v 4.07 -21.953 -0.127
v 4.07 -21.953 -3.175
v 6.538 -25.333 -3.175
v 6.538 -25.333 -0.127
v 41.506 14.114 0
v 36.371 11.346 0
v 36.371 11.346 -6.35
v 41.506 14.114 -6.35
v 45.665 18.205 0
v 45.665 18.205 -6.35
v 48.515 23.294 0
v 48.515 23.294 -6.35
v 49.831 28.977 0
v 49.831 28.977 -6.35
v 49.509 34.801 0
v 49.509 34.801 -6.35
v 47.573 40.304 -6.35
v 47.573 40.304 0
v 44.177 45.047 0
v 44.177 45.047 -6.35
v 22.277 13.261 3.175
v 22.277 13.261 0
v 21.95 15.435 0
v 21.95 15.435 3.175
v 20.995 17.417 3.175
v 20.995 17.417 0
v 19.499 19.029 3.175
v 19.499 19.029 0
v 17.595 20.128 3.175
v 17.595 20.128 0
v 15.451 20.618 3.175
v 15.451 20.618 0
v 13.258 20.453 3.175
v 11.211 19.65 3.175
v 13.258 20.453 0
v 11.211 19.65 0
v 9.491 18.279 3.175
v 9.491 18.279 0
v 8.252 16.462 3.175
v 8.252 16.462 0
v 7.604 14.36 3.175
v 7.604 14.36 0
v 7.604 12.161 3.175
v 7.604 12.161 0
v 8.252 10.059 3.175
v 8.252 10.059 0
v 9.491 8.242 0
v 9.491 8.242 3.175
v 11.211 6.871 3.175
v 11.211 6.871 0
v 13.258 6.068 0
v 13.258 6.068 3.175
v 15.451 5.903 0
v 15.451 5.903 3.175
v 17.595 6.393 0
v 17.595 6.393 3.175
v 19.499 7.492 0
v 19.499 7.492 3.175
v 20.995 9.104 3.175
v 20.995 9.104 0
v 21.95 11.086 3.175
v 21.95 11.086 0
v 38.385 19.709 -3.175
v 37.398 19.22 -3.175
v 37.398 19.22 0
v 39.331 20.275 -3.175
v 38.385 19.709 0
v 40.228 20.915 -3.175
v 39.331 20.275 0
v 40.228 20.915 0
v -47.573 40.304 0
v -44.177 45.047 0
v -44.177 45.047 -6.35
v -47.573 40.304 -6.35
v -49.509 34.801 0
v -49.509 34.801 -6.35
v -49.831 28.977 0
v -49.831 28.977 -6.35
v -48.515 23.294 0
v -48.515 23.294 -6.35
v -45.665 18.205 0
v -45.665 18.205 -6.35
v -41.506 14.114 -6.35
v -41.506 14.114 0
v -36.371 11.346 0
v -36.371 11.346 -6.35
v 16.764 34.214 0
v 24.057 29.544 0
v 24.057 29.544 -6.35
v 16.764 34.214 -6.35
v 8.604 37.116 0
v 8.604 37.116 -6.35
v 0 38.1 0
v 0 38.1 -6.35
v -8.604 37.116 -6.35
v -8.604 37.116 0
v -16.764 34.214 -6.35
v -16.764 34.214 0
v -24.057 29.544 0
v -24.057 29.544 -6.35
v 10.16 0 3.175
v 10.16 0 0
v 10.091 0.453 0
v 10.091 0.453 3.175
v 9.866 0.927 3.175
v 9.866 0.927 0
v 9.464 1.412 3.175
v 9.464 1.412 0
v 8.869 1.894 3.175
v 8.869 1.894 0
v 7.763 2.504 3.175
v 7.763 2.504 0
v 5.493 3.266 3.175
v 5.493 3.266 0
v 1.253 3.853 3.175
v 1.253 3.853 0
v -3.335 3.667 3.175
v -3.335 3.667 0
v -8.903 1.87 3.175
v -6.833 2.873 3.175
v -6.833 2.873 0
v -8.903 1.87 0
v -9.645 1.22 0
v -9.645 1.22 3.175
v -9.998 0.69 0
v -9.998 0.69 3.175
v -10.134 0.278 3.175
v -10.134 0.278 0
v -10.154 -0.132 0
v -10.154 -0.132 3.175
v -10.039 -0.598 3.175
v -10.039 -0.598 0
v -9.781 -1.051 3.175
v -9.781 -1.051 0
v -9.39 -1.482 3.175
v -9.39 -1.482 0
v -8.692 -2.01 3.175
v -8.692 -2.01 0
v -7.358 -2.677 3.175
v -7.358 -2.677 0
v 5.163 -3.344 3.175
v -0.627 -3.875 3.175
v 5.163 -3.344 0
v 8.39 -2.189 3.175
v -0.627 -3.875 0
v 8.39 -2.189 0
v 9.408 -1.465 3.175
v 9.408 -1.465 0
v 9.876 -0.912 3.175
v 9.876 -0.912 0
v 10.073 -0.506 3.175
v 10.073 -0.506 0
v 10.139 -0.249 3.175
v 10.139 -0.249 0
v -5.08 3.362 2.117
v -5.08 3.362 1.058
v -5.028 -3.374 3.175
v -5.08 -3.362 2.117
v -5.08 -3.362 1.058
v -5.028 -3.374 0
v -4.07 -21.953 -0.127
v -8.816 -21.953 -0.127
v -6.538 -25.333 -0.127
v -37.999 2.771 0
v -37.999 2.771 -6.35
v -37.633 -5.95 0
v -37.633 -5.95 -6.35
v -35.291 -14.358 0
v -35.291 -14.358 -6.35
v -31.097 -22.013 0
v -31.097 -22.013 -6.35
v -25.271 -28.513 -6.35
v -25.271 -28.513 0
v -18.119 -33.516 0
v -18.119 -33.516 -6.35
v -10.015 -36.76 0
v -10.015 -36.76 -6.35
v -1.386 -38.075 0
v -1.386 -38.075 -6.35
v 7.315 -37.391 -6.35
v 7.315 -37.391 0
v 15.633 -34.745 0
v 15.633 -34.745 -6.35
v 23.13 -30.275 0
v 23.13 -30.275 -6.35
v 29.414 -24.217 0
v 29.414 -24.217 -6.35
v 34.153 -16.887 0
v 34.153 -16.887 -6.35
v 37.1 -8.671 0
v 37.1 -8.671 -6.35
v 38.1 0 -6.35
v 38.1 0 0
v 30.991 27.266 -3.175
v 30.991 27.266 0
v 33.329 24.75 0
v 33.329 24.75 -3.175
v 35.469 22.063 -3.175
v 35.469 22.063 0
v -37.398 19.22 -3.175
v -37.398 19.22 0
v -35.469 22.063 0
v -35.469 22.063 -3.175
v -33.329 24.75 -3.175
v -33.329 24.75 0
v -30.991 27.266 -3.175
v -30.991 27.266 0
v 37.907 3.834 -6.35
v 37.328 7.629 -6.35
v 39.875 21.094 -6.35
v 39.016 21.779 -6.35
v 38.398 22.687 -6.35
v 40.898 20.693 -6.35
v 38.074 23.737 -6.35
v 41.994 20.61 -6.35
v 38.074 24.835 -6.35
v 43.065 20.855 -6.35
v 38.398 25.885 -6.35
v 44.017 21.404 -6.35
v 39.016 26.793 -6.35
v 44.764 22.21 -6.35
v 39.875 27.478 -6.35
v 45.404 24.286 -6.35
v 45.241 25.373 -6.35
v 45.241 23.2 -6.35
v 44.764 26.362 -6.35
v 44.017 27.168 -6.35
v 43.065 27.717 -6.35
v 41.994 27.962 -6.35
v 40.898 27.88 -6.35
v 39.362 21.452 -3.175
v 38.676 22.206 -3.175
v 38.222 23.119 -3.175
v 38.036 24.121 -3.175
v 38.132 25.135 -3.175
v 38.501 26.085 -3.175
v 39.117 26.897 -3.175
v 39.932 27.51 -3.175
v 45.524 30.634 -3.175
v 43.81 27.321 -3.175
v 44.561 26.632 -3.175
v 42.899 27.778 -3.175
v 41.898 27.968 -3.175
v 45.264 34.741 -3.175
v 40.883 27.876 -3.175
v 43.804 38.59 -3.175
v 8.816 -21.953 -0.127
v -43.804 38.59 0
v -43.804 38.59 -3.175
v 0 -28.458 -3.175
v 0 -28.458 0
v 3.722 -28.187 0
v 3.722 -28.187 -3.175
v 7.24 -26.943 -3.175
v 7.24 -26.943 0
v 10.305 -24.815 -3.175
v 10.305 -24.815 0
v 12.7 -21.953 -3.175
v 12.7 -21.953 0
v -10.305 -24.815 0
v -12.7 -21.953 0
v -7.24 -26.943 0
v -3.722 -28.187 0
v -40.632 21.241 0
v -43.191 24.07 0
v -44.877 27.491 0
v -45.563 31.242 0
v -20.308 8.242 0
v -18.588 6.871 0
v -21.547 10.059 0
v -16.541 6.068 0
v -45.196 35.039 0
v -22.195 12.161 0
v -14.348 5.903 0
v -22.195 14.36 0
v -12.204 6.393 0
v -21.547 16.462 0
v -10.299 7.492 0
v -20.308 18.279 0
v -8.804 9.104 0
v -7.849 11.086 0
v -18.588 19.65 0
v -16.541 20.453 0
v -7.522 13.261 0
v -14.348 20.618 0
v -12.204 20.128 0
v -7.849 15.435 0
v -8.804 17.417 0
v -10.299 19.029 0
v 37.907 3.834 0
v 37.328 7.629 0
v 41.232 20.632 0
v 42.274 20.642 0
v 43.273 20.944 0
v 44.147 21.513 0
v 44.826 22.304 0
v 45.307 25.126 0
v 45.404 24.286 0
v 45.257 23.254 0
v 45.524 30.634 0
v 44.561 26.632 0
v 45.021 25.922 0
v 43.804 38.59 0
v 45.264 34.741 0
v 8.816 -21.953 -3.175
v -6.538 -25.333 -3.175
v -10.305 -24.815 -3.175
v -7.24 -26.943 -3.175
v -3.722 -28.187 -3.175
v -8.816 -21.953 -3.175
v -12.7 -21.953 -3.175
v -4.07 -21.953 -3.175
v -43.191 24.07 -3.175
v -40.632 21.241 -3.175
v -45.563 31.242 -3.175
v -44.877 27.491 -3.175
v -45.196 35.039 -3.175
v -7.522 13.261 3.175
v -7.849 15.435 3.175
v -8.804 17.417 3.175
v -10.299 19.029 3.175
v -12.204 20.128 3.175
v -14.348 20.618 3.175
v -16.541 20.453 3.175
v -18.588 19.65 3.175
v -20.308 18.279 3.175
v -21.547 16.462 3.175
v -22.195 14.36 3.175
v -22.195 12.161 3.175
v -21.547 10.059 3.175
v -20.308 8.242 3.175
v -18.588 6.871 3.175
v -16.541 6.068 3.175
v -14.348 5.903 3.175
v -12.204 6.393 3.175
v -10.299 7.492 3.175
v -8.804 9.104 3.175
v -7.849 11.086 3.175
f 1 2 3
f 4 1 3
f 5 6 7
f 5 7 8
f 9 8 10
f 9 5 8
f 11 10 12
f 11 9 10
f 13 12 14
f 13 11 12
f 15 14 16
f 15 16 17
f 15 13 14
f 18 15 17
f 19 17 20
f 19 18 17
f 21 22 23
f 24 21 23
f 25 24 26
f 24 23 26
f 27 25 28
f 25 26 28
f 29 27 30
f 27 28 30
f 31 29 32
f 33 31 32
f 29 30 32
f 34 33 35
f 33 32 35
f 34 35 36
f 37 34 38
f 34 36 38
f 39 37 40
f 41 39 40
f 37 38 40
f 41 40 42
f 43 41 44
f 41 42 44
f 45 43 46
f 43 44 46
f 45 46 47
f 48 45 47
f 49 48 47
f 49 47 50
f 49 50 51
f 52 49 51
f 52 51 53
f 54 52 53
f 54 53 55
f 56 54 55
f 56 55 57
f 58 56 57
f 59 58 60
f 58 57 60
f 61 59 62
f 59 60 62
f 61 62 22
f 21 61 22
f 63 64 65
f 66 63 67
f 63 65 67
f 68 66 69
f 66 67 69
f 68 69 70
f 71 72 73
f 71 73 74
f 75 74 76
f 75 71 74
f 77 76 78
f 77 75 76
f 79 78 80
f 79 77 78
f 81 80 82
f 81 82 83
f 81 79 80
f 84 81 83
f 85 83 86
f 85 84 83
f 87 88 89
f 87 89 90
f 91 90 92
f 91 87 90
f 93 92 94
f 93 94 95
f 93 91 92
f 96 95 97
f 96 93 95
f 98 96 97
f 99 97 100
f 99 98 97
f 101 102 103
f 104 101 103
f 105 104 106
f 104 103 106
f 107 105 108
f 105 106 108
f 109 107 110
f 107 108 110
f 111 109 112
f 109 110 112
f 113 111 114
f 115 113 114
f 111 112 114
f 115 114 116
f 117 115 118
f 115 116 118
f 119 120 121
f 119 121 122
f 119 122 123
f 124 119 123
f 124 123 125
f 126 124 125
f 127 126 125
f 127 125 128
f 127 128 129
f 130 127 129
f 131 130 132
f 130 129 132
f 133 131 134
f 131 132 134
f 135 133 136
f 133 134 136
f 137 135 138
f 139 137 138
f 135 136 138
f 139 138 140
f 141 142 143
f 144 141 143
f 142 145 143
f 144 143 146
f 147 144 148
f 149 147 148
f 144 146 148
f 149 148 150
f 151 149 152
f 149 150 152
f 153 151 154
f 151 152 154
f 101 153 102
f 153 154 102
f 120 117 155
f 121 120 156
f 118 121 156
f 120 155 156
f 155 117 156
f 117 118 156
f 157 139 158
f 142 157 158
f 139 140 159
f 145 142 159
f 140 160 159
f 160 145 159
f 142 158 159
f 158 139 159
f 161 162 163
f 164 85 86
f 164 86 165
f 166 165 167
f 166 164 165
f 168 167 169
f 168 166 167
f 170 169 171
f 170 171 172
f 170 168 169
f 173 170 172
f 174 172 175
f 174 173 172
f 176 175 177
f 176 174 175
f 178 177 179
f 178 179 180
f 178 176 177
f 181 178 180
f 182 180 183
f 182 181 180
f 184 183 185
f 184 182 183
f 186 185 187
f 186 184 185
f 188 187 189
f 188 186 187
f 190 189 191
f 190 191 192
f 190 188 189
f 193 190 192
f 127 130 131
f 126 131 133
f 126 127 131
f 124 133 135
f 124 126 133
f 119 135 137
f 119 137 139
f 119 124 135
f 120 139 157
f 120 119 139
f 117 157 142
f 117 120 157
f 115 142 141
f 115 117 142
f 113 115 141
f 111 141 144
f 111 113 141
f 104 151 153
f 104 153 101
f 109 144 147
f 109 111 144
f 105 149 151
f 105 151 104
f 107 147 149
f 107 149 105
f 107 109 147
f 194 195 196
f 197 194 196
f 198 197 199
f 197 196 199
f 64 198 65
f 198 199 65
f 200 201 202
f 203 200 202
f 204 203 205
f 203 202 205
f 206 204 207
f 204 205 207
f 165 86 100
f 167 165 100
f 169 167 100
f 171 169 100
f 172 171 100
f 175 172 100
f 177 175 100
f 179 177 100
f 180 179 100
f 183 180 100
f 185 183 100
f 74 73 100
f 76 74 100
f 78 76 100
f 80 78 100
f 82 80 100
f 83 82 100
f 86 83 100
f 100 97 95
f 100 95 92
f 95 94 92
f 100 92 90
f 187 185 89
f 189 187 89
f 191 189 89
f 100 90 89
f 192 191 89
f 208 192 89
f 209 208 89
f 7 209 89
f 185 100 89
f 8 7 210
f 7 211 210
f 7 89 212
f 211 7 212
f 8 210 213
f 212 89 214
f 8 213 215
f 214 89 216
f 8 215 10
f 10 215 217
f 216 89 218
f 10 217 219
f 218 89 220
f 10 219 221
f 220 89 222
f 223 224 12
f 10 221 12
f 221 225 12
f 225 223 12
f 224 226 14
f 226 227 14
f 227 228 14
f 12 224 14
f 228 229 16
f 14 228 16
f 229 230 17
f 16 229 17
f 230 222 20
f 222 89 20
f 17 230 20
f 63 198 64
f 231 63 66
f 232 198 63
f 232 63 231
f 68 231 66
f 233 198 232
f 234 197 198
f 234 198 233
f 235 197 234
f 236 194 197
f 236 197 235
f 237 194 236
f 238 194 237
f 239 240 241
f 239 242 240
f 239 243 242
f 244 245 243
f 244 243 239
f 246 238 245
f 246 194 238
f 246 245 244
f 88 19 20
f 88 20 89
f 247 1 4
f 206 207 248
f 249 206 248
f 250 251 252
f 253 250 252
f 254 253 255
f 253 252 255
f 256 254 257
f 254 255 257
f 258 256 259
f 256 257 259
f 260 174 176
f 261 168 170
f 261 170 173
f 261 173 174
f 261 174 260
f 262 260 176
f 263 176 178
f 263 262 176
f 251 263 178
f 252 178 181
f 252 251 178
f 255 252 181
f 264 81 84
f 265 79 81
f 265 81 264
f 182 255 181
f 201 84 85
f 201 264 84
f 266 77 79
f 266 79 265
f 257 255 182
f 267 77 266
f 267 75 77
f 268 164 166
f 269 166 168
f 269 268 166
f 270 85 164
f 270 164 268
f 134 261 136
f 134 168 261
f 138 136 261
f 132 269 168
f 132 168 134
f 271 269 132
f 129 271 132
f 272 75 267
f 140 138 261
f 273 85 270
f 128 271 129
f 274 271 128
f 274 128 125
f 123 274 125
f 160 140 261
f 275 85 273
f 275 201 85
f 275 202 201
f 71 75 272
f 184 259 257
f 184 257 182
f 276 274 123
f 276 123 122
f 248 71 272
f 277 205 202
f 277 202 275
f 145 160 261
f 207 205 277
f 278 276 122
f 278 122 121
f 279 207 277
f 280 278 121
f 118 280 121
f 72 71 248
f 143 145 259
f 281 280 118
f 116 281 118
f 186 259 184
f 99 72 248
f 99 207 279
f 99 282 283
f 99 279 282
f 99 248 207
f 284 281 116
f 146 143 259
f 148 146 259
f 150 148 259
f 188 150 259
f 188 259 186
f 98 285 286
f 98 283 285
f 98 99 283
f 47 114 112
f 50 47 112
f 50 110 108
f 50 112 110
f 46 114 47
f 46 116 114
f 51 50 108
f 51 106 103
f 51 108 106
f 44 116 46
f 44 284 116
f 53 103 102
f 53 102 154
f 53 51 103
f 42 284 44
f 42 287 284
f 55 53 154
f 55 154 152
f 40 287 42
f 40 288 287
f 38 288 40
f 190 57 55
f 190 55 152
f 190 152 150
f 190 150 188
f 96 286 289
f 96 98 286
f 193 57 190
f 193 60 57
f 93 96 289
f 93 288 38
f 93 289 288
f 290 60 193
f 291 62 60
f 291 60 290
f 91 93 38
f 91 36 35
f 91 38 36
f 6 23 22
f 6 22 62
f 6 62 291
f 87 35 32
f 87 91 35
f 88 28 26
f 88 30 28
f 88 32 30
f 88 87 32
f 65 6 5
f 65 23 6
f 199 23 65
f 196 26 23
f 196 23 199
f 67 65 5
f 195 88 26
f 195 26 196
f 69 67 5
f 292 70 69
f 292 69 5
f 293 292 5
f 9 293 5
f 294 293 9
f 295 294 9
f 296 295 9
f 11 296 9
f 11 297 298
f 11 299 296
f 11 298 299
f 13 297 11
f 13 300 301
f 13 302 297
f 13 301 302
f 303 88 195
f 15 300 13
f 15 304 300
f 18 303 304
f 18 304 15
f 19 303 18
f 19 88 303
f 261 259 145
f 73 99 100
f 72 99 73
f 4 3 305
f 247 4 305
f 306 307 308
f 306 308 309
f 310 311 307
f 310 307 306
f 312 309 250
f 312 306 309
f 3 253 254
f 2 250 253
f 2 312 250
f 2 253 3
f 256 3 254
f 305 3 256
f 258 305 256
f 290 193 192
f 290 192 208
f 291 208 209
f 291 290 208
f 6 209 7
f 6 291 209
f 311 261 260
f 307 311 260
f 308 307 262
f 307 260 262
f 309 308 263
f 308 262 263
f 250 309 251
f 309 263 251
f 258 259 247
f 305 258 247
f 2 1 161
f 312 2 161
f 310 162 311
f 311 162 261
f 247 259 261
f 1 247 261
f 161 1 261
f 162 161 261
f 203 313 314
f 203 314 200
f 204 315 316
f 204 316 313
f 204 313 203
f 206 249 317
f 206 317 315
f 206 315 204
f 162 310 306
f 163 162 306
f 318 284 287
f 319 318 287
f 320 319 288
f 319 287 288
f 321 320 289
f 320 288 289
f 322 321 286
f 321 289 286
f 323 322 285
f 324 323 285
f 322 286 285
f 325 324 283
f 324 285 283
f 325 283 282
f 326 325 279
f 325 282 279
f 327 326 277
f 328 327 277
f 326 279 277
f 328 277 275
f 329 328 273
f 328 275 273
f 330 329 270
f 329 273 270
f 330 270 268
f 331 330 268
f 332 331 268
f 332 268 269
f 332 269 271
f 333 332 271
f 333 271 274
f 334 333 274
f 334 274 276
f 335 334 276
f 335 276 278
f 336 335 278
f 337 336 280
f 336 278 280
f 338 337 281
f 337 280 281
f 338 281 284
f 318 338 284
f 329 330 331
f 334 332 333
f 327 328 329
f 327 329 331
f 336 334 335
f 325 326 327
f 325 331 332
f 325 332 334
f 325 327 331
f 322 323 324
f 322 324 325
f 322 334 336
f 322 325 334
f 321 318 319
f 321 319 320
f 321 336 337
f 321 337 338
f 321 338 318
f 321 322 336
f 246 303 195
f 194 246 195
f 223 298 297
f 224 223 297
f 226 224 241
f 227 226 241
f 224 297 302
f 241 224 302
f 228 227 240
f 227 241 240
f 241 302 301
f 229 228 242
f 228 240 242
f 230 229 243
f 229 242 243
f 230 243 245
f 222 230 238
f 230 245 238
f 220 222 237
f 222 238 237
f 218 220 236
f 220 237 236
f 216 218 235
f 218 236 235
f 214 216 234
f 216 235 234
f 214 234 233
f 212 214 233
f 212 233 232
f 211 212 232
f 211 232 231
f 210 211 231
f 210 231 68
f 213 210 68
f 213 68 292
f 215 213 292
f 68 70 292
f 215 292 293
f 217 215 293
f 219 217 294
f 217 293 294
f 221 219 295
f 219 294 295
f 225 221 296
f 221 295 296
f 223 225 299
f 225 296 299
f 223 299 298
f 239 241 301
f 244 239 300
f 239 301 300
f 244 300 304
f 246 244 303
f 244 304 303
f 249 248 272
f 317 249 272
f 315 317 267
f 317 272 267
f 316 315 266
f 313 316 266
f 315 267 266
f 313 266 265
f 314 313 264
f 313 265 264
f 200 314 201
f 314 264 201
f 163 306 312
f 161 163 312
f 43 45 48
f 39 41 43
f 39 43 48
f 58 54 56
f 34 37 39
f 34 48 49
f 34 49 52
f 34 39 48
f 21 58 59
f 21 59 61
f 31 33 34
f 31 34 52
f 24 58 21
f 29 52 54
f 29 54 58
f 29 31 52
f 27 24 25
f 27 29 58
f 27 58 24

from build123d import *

# Parameters (mm, degrees)
F1_DEPTH  = 6.35
F3_DEPTH  = 3.175
F6_DEPTH  = 3.175
F8_DEPTH  = 3.175
F10_DEPTH = 3.048
F4_R      = 7.3778565178
F11_DEPTH = 3.175
F12_R     = 3.6859176852
F13_DEPTH = 6.351


# Not quite as in the source:
# - a feature names something its author has since deleted; it is built from what else it names


with BuildPart() as f1:
    # F0 (on Top) → F1 (new body)
    with BuildSketch(Plane.XY):
        with BuildLine():
            ThreePointArc((-36.3712396262, 11.3464940865), (-5.738718073, -37.6653304098), (38.1, 0))
            ThreePointArc((38.1, 0), (37.6653304098, 5.738718073), (36.3712396262, 11.3464940865))
            ThreePointArc((36.3712396262, 11.3464940865), (31.5544319278, 21.3524665018), (24.0569263159, 29.5444461148))
            ThreePointArc((24.0569263159, 29.5444461148), (0, 38.1), (-24.0569263159, 29.5444461148))
            ThreePointArc((-24.0569263159, 29.5444461148), (-31.5544319278, 21.3524665018), (-36.3712396262, 11.3464940865))
        make_face()
        with BuildLine():
            ThreePointArc((24.0569263159, 29.5444461148), (31.5544319278, 21.3524665018), (36.3712396262, 11.3464940865))
            ThreePointArc((36.3712396262, 11.3464940865), (49.3746579826, 26.088688726), (44.1774778249, 45.0468139009))
            Line((44.1774778249, 45.0468139009), (24.0569263159, 29.5444461148))
        make_face()
        with BuildLine():
            ThreePointArc((-44.1774778249, 45.0468139009), (-49.3746579826, 26.088688726), (-36.3712396262, 11.3464940865))
            ThreePointArc((-36.3712396262, 11.3464940865), (-31.5544319278, 21.3524665018), (-24.0569263159, 29.5444461148))
            Line((-24.0569263159, 29.5444461148), (-44.1774778249, 45.0468139009))
        make_face()
    extrude(amount=-F1_DEPTH)

    # F2 (on Top) → F3 (join)
    with BuildSketch(Plane.XY):
        with BuildLine():
            add(Edge.make_bspline(
                [(10.16, 0), (10.16, 6.7242064297), (-5.08, 3.3621032148), (-20.32, 0), (-5.08, -3.3621032148), (10.16, -6.7242064297), (10.16, 0)],
                knots=[0, 0, 0, 2.0943951024, 2.0943951024, 4.1887902048, 4.1887902048, 6.2831853072, 6.2831853072, 6.2831853072], degree=2, weights=[1, 0.5, 1, 0.5, 1, 0.5, 1]))
        make_face()
    extrude(amount=F3_DEPTH)

    # F5 (on face) → F6 (cut)
    with BuildSketch(Plane.XY):
        with BuildLine():
            Line((-30.9908390045, 27.2659789771), (-43.804358691, 38.5895557702))
            ThreePointArc((-43.804358691, 38.5895557702), (-44.8770730118, 27.4905174143), (-37.3975988477, 19.2202795297))
            ThreePointArc((-37.3975988477, 19.2202795297), (-34.4250124692, 23.4269092732), (-30.9908390045, 27.2659789771))
        make_face()
        with BuildLine():
            ThreePointArc((37.3975988477, 19.2202795297), (44.8770730118, 27.4905174143), (43.804358691, 38.5895557702))
            Line((43.804358691, 38.5895557702), (30.9908390045, 27.2659789771))
            ThreePointArc((30.9908390045, 27.2659789771), (34.4250124692, 23.4269092732), (37.3975988477, 19.2202795297))
        make_face()
    extrude(amount=-F6_DEPTH, mode=Mode.SUBTRACT)

    # F7 (on face) → F8 (cut)
    with BuildSketch(Plane.XY):
        with BuildLine():
            Line((12.7, -21.9528563652), (0, -21.9528563652))
            Line((0, -21.9528563652), (-12.7, -21.9528563652))
            ThreePointArc((-12.7, -21.9528563652), (-7.2401700339, -26.9432924529), (0, -28.4579321742))
            ThreePointArc((0, -28.4579321742), (7.2401700339, -26.9432924529), (12.7, -21.9528563652))
        make_face()
    extrude(amount=-F8_DEPTH, mode=Mode.SUBTRACT)

    # F9 (on face) → F10 (join)
    with BuildSketch(Plane.XY.offset(-3.175)):
        Polygon((-4.0704635903, -21.9528563652), (-8.815612644, -21.9528563652), (-6.5379412845, -25.3327768296), align=None)
        Polygon((4.0704635903, -21.9528563652), (6.5379412845, -25.3327768296), (8.815612644, -21.9528563652), align=None)
    extrude(amount=F10_DEPTH)

    # F4 (on face) → F11 (join)
    with BuildSketch(Plane.XY):
        with Locations((-14.8994419724, 13.2605032995)):
            Circle(F4_R)
        with Locations((14.8994419724, 13.2605032995)):
            Circle(F4_R)
    extrude(amount=F11_DEPTH)

    # F12 (on face) → F13 (cut, through all)
    with BuildSketch(Plane.XY):
        with Locations((41.7184382677, 24.286089465)):
            Circle(F12_R)
    extrude(amount=-F13_DEPTH, mode=Mode.SUBTRACT)


solid = f1.part
